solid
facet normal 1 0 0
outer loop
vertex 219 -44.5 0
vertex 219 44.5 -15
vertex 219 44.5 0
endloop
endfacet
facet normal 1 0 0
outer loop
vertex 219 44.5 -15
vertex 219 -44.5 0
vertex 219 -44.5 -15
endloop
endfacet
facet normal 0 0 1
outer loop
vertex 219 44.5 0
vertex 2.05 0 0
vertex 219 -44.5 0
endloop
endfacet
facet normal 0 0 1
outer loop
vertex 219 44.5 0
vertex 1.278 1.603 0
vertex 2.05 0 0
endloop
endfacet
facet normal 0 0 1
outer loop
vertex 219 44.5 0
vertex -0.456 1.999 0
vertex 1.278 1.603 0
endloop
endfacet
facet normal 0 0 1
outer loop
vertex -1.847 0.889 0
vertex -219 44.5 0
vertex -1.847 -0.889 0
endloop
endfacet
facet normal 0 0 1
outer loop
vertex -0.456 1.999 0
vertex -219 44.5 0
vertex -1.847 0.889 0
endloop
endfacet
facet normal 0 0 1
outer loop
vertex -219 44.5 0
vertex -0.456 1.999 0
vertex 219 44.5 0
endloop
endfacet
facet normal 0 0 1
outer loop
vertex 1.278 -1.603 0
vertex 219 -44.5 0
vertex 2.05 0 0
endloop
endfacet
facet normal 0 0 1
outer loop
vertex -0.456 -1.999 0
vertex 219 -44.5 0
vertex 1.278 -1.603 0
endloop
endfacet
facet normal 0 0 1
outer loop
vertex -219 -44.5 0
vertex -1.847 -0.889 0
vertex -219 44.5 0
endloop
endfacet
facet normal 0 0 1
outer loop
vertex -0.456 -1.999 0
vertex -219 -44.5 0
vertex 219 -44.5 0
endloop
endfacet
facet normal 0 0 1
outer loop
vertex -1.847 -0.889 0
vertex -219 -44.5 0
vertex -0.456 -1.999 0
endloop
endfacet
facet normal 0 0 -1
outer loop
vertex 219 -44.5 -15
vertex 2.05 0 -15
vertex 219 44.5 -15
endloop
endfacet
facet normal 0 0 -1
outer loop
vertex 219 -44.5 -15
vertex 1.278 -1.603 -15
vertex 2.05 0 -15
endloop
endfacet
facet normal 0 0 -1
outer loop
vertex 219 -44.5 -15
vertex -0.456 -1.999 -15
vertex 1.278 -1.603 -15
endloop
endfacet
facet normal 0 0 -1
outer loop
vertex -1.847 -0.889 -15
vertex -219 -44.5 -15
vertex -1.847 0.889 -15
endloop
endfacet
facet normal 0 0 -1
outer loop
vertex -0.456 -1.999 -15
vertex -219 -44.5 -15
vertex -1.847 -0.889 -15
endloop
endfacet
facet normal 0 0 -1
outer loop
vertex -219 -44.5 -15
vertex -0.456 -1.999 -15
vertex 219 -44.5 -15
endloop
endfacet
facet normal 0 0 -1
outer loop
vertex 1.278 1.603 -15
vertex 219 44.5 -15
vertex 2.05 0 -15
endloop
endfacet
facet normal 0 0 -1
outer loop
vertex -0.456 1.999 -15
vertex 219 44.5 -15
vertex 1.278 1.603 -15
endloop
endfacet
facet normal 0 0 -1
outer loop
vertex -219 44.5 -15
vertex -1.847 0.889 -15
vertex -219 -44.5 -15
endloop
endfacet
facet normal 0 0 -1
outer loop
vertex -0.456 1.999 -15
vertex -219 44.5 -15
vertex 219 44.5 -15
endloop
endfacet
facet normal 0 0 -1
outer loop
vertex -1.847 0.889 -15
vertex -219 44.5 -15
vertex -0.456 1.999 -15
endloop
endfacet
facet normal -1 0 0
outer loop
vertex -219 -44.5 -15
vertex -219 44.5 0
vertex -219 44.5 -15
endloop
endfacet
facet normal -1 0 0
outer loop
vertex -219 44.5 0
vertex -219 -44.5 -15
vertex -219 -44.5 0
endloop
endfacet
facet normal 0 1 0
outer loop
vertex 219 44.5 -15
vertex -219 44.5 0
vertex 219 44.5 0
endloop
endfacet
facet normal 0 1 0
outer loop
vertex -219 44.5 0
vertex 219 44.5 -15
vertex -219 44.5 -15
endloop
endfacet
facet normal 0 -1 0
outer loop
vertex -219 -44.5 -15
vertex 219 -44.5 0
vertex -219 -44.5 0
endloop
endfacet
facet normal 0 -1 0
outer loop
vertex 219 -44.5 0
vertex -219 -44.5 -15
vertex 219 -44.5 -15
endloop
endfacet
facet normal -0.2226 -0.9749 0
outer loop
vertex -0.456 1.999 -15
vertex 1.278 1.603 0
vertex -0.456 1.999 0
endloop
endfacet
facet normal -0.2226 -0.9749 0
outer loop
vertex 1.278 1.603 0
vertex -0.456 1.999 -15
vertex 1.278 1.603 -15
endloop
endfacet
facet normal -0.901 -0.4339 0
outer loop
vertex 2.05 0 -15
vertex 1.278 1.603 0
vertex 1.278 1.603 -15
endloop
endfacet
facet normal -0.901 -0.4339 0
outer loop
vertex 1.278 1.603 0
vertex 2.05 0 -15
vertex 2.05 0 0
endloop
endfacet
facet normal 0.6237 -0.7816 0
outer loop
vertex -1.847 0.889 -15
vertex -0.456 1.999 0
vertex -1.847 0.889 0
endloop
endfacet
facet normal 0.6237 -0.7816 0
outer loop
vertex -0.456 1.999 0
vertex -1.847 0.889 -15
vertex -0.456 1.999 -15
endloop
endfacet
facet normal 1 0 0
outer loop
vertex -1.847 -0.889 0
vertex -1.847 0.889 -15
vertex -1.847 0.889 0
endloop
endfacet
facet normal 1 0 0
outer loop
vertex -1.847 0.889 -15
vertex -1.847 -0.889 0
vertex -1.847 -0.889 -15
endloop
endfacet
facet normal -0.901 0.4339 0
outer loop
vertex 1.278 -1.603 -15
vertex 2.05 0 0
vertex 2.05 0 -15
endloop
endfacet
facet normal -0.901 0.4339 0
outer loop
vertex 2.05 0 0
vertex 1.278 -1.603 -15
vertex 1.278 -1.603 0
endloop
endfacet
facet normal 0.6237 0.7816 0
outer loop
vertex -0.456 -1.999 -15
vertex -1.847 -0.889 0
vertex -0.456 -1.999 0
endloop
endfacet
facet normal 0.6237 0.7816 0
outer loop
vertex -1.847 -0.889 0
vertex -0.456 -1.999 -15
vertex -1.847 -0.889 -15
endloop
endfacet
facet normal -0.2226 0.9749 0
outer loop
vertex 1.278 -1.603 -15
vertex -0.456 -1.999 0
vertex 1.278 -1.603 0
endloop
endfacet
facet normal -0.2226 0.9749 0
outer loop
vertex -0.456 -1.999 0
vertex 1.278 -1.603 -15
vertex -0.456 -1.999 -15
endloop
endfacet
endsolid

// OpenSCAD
// file: variabile.scad
//parametrii generali
latime_exterioara_dulap = 500; //mm
adancime_exterioara_dulap = 500; //mm
inaltime_utila_segment_dulap = 90; //inaltimea utila minima
numar_segmente_dulap = 4;

//definitii legate de materiale
grosime_exterior_dulap = 15;
grosime_fund_sertar = 15;
grosime_laterale_sertar = 15;

//gauri de surub si cap surub
diametru_gauri_holzsurub = 2.1;
diametru_gauri_surub = 2.1; //doar pt ghidare, dau gaura cu 8mm lemn
diametru_cap_surub = 20;
// calculez adancimea din datele surubului
lungime_filet_surub = 20; //mm
lungime_filet_ramas = 10; //mm, cat ramane pentru piulita
adancime_cap_surub = (grosime_laterale_sertar - (lungime_filet_surub-lungime_filet_ramas)/2);
echo();
echo("adancime_cap_surub:", adancime_cap_surub);
echo();

// dimensiuni slot-uri
grosime_slot_sertar = grosime_fund_sertar + 1; //1mm toleranta
adancime_slot_sertar = 6;

/*
    variabile specifice dulapului exterior
*/
//variabile specifice lateralei de dulap
inaltime_initiala = 1;// primul slot pleaca putin deasupra fundului
inaltime_segment_dulap = inaltime_utila_segment_dulap + grosime_slot_sertar;
inaltime_laterala = 2*grosime_exterior_dulap + inaltime_initiala + inaltime_segment_dulap*numar_segmente_dulap;
echo();
echo("inaltime_segment_dulap: ",inaltime_segment_dulap);
echo("inaltime_laterala: ",inaltime_laterala);
echo();

numar_suruburi_capace_sus_jos = 5;
offset_suruburi_capace_sus_jos = 30; // de la marginea placii la centrul primei gauri
//distanta_fata_de_centru_gauri_laterale = 100;
distanta_fata_de_centru_gauri_laterale =adancime_exterioara_dulap/3;
pozitie_gauri_de_sus = 2; // sloturi
pozitie_gauri_de_jos = 1; // sloturi


//variabile specifice capacelor de sus si jos
adancime_capac_sus_jos = adancime_exterioara_dulap; //mm
latime_capac_sus_jos = latime_exterioara_dulap - 2*grosime_exterior_dulap;
numar_suruburi_capac_fund = 5; // in cate suruburi fixez fundul
offset_suruburi_fund = 30; // de la marginea bucatii la centrul primei gauri
distanta_suruburi_fixare_module_sus_jos = adancime_capac_sus_jos/3; //mm

gauri_fixare_picioare = true;
distanta_gauri_picioare_centru_centru = 50;
latime_suport_picioare = 80;
offset_fata = 30; // de la marginea din fata 
offset_laterala = 30; // de la peretele lateral


//variabile specifice fundului de dulap
distanta_suruburi_fixare_fund = 200; //mm or undef if not required
adancime_fund = inaltime_laterala - 2*grosime_exterior_dulap;
latime_fund = latime_exterioara_dulap - 2*grosime_exterior_dulap;




/*
    variabile specifice sertarelor
*/
// trebui ajustata in functie de dulap si grosimile reale
// la placajul meu,se mai aduna 2mm 
toleranta_fund_sertar_laterale = 0;//mm - se imparte la 2 pt cele 2 margini, vezi pt ce corp le faci
toleranta_adancime_fund_sertar = 2;//mm - sertarul e putin mai scurt
toleranta_pereti_sertar = 1; // de fiecare parte, intre dulap si sertar, muta centrul gaurilor spre centrul fundului de sertar
toleranta_inaltime_sertar = 1;

gaura_maner = 1;
diametru_gaura_maner=4.1;
/*
adancime_maner_fund_sertar = 20;// cat iese manerul in afara
latime_maner_fund_sertar = 80;
raza_rotunjire_maner_fund_sertar=5;
*/
//gauri folosite la ansamblarea sertarului, auxiliare
diametru_gauri_aliniere_margini_sertar=3;
foloseste_pini_aliniere_laterala_lunga = true;
numar_gauri_aliniere_laterala_lunga=3;
offset_gauri_aliniere_laterala_lunga=40;
foloseste_pini_aliniere_laterala_scurta = true;
numar_gauri_aliniere_laterala_scurta=3;
offset_gauri_aliniere_laterala_scurta=30;

// dimensiunile fundului de sertar
adancime_fund_sertar = adancime_capac_sus_jos-grosime_exterior_dulap-toleranta_adancime_fund_sertar;
// e echivalenta cu latimea capacelor sus/jos + adancime sloturi - toleranta in lateral
latime_fund_sertar = (latime_exterioara_dulap - 2*grosime_exterior_dulap) + 2*adancime_slot_sertar-toleranta_fund_sertar_laterale;
echo("adancime_fund_sertar:",adancime_fund_sertar);
echo("latime_fund_sertar:", latime_fund_sertar);

// parametrii pentru gaurile ce fixeaza laterala lunga in fundul de sertar
gauri_fixare_laterala_lunga_sertar = true; // pune false ca sa dispara gaurile
offset_gauri_laterala_lunga_fund_sertar = 50;// de la margini, locatia primei gauri
numar_gauri_laterala_lunga_fund_sertar = 3; // numar impar neaparat, >1
assert(numar_gauri_laterala_lunga_fund_sertar>1, "numar_gauri_laterala_lunga_fund_sertar trebuie sa fie mai mare ca 1");
assert(1==numar_gauri_laterala_lunga_fund_sertar%2,"numar_gauri_laterala_lunga_fund_sertar trebuie sa fie un numar impar");

// parametrii pentru gaurile ce fixeaza laterala scurta in fundul de sertar
gauri_fixare_laterala_scurta_sertar = true; // pune false ca sa dispara
offset_gauri_laterala_scurta_fund_sertar = 50;
numar_gauri_laterala_scurta_fund_sertar = 3;
assert(numar_gauri_laterala_scurta_fund_sertar>1,"numar_gauri_laterala_scurta_fund_sertar trebuie sa fie mai mare ca 1");
assert(1==numar_gauri_laterala_scurta_fund_sertar%2,"numar_gauri_laterala_scurta_fund_sertar trebuie sa fie numar impar");

// parametrii pentru laterala lunga de sertar
numar_gauri_fixare_laterala_lunga_in_scurta = 1; // 1 sau numar impar
offset_gauri_laterala_lunga_in_scurta = 0;
assert(1==numar_gauri_fixare_laterala_lunga_in_scurta%2, "numar_gauri_fixare_laterala_lunga_in_scurta trebuie sa fie numar impar");

// functii auxiliare
/*
    formeaza obiectul ce contine capul de surub si surubul
    obiectul se scade din placa de baza
*/
module gauraCompusaLaterala() {
    union() {
        translate([0,0,-adancime_cap_surub/2])
            cylinder(h=adancime_cap_surub, r=diametru_cap_surub/2, center=true);
        translate([0,0,-grosime_exterior_dulap/2])
            cylinder(h=grosime_exterior_dulap , r=diametru_gauri_surub/2,center=true);
    }
}
// main file
include <variabile.scad>

module obiectDeBaza() {
    latimeLateralaScurta = latime_fund_sertar - 2*adancime_slot_sertar - 2*toleranta_pereti_sertar - 2*grosime_laterale_sertar;
    inlatimeLateralaScurta = inaltime_utila_segment_dulap-toleranta_inaltime_sertar;
    echo("---");
    echo("LATERALA SCURTA SERTAR");
    echo("latime LateralaScurta:", latimeLateralaScurta);
    echo("inaltime LateralaScurta:", inlatimeLateralaScurta);
    translate([0,0, -grosime_laterale_sertar/2])
        cube([latimeLateralaScurta, inlatimeLateralaScurta ,grosime_laterale_sertar], true);
}

module gauraManer() {
    if(1==gaura_maner) {
        translate([0,0,-grosime_laterale_sertar/2])
            cylinder(h=grosime_laterale_sertar, r=diametru_gaura_maner/2, center=true);
    } else {
    }
}


difference() {
    obiectDeBaza();
    gauraManer();
}
